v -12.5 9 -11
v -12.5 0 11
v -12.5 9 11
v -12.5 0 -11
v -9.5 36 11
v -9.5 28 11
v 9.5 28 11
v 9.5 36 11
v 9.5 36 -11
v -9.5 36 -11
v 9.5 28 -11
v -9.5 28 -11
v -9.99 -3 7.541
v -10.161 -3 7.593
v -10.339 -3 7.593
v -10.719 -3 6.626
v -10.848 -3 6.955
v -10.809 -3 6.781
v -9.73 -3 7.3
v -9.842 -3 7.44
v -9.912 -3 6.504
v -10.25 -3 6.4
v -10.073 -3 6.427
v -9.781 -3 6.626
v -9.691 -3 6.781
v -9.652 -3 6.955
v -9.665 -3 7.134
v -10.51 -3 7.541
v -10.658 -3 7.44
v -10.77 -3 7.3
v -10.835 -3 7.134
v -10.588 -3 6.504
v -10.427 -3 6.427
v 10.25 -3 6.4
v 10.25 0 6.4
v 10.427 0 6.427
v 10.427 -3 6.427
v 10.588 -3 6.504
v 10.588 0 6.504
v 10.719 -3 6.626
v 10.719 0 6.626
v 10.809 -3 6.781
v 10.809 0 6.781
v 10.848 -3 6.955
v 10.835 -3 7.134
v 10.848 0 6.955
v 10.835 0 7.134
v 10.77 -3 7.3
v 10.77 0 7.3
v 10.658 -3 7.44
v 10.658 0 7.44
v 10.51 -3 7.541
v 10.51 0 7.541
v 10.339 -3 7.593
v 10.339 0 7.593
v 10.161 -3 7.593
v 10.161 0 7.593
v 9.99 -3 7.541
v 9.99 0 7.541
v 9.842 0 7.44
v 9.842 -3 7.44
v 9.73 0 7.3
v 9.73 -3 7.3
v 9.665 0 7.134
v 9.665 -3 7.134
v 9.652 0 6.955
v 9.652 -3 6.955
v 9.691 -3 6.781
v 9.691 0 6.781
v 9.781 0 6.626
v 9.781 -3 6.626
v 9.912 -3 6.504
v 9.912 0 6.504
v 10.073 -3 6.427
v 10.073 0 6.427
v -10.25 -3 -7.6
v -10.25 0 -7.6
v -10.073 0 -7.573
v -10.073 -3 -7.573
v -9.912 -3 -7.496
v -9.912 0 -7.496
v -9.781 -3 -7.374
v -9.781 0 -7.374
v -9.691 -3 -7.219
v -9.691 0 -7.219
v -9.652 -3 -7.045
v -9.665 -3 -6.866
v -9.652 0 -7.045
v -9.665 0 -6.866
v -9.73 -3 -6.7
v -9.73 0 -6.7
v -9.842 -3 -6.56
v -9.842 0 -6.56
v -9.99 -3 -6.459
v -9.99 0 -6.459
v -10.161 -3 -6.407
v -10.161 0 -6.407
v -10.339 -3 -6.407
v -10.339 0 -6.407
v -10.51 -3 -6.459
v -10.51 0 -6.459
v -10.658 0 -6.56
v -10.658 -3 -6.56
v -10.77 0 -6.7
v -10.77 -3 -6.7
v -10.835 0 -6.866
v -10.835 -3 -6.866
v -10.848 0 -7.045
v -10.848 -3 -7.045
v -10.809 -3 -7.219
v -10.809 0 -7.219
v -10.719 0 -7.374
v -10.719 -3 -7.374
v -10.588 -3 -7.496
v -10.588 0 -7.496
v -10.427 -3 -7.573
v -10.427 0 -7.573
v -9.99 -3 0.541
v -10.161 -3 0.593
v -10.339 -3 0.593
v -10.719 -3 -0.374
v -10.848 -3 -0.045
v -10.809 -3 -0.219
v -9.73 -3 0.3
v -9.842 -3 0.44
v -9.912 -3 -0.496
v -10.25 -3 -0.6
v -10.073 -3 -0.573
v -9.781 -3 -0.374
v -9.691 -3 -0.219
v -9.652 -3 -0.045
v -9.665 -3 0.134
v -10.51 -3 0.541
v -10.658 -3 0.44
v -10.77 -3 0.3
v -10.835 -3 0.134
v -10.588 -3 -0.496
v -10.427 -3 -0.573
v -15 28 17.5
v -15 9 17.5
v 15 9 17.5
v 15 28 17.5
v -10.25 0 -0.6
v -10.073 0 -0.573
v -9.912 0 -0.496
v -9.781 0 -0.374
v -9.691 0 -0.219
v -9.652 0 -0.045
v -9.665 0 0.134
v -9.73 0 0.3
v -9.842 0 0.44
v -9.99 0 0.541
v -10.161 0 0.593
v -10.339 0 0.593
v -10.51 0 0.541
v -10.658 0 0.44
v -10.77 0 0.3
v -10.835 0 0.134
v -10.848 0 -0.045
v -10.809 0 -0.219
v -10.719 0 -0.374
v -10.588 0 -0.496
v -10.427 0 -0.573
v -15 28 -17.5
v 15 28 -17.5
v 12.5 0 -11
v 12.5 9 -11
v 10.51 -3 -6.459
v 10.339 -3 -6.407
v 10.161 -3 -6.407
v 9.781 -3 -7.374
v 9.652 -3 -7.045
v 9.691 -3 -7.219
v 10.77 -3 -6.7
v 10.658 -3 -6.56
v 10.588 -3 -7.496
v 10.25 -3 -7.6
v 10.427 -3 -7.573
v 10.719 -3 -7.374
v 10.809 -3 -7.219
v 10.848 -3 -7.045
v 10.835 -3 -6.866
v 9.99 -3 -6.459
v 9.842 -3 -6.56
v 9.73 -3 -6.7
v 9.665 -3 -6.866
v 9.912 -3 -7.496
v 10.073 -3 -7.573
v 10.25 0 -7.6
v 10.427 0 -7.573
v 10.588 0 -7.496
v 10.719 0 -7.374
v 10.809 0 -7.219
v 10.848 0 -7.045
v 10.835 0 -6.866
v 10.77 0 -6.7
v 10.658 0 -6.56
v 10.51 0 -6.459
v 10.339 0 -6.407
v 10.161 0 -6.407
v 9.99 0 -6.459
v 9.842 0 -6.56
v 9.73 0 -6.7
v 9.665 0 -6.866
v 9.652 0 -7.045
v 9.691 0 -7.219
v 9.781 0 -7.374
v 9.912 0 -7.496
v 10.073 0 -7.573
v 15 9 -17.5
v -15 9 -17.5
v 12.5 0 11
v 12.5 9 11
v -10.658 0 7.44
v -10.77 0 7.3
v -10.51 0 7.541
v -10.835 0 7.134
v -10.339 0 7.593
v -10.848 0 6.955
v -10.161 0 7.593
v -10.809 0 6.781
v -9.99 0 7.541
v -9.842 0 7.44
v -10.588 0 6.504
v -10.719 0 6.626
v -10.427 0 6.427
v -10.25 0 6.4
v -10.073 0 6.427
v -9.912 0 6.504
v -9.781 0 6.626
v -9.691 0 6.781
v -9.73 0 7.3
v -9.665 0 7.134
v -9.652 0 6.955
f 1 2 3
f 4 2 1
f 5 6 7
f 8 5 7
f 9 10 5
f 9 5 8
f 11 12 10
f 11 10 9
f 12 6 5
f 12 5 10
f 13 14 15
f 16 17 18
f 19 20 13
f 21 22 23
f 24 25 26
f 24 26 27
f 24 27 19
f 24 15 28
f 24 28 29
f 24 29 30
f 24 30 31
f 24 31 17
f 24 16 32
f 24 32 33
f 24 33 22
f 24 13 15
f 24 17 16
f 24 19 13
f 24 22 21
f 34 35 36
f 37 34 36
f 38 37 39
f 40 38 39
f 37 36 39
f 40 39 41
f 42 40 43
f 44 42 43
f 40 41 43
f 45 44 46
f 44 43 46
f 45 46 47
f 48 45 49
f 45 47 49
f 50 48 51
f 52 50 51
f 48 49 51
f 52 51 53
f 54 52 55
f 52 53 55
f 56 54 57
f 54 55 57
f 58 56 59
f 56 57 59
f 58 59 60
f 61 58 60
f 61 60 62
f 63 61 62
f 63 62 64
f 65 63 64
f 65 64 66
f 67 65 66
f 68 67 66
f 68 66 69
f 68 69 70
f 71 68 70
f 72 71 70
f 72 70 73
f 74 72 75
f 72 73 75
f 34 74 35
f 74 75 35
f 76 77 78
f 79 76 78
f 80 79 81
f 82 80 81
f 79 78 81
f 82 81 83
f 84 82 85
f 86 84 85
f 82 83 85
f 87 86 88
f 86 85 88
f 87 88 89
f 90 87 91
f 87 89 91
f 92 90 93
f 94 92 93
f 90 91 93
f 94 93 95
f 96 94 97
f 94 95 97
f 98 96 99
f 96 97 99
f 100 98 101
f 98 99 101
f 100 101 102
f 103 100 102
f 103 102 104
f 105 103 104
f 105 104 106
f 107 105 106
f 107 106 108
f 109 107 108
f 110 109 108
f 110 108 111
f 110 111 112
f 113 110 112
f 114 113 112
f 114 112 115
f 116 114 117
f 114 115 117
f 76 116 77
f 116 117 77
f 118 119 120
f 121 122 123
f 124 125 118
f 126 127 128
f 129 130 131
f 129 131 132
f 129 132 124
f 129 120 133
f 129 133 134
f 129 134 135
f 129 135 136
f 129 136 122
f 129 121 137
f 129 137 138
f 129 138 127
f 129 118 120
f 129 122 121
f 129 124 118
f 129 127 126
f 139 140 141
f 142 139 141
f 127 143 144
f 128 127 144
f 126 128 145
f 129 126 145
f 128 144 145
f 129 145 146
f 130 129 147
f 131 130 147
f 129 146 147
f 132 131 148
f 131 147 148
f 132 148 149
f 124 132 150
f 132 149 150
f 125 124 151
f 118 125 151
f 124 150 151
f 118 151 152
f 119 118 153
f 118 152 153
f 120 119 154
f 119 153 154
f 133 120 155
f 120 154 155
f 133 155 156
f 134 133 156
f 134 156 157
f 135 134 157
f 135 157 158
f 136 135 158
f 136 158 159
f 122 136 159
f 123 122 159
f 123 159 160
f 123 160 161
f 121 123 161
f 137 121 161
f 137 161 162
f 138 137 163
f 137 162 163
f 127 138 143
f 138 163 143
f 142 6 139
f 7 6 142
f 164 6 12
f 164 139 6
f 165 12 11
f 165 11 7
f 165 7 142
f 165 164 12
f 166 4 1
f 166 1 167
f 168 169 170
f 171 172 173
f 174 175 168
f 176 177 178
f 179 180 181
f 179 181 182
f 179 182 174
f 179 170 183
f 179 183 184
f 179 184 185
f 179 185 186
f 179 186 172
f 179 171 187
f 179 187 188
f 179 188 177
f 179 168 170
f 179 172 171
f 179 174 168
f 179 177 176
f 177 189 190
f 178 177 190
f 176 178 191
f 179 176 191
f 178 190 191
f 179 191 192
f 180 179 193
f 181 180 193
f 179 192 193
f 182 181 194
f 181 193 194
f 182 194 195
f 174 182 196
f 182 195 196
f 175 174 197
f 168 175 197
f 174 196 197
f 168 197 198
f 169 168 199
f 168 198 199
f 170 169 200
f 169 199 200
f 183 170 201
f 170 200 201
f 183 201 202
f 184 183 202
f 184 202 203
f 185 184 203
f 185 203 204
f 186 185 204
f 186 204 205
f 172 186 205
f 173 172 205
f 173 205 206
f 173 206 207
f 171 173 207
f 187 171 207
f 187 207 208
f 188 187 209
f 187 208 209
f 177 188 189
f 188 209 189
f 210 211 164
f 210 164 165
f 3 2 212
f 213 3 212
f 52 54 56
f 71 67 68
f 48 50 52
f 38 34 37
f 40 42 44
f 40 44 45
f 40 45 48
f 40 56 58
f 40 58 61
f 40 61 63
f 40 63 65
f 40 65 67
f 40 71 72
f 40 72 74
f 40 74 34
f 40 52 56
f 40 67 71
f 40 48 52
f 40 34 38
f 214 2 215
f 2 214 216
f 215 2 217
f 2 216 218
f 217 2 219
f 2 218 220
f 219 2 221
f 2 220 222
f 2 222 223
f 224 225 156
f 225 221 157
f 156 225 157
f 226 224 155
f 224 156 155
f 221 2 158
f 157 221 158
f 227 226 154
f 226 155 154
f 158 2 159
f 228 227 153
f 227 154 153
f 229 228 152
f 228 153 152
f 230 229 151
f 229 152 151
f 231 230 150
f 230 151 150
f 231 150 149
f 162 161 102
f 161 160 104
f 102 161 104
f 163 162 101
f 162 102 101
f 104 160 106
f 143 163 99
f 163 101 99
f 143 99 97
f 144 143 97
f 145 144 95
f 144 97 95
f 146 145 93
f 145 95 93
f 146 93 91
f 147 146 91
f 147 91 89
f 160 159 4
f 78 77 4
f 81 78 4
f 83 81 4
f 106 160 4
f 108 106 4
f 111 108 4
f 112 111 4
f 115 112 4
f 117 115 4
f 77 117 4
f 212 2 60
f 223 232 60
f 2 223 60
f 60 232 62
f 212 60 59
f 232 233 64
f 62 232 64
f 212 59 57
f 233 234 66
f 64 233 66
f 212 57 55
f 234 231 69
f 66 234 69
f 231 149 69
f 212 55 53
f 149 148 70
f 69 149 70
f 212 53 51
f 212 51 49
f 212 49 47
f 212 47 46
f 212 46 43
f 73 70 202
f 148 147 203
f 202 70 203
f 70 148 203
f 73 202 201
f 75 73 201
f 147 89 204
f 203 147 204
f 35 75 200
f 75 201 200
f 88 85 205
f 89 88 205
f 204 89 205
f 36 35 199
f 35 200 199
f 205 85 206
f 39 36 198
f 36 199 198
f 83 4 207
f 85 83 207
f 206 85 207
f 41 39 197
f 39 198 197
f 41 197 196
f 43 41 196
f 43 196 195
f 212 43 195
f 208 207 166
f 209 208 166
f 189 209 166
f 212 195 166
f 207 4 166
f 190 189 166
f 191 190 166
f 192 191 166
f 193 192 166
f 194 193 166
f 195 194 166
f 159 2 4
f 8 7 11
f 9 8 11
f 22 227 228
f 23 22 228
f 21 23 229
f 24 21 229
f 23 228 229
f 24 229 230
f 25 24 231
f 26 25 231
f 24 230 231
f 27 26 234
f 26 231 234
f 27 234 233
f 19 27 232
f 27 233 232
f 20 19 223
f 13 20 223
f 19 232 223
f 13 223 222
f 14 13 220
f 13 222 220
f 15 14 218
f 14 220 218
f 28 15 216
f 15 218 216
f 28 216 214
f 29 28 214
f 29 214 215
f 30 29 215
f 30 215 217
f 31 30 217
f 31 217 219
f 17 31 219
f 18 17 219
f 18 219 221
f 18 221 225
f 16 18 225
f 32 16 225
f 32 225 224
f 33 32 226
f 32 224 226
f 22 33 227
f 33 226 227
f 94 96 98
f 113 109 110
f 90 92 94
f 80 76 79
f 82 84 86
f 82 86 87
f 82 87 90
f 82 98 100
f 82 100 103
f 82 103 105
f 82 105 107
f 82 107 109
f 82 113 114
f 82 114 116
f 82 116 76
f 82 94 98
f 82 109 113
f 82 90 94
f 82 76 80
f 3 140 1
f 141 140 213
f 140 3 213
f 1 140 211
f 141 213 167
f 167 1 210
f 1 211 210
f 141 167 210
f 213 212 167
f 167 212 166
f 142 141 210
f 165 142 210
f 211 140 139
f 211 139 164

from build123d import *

# Parameters (mm, degrees)
SKETCH_1_W      = 25
SKETCH_1_H      = 22
EXTRUDE_1_DEPTH = 9
SKETCH_2_W      = 19
SKETCH_2_H      = 22
EXTRUDE_2_DEPTH = 27
SKETCH_4_R      = 0.6
EXTRUDE_4_DEPTH = 3
SKETCH_3_W      = 30
SKETCH_3_H      = 35
SKETCH_3_W_2    = 19
SKETCH_3_H_2    = 22
EXTRUDE_6_DEPTH = 19


with BuildPart() as part:
    # Эскиз1 → Бобышка-Вытянуть1 (new body)
    with BuildSketch(Plane(origin=(0, 0, 0), x_dir=(1, 0, 0), z_dir=(0, 1, 0))):
        Rectangle(SKETCH_1_W, SKETCH_1_H)
    extrude(amount=EXTRUDE_1_DEPTH)

    # Эскиз2 → Бобышка-Вытянуть2 (add)
    with BuildSketch(Plane(origin=(0, 9, 0), x_dir=(1, 0, 0), z_dir=(0, 1, 0))):
        Rectangle(SKETCH_2_W, SKETCH_2_H)
    extrude(amount=EXTRUDE_2_DEPTH)

    # Эскиз4 → Бобышка-Вытянуть4 (add)
    with BuildSketch(Plane.XZ):
        with Locations(Location((10.25, -7, 0), (0, 0, 270))):
            Circle(SKETCH_4_R)
        with Locations(Location((10.25, 7, 0), (0, 0, 270))):
            Circle(SKETCH_4_R)
        with Locations(Location((-10.25, 7, 0), (0, 0, 270))):
            Circle(SKETCH_4_R)
        with Locations(Location((-10.25, -7, 0), (0, 0, 270))):
            Circle(SKETCH_4_R)
        with Locations(Location((-10.25, 0, 0), (0, 0, 270))):
            Circle(SKETCH_4_R)
    extrude(amount=EXTRUDE_4_DEPTH)

    # Эскиз3 → Бобышка-Вытянуть6 (add)
    with BuildSketch(Plane(origin=(0, 9, 0), x_dir=(1, 0, 0), z_dir=(0, 1, 0))):
        Rectangle(SKETCH_3_W, SKETCH_3_H)
        Rectangle(SKETCH_3_W_2, SKETCH_3_H_2, mode=Mode.SUBTRACT)
    extrude(amount=EXTRUDE_6_DEPTH)


solid = part.part
